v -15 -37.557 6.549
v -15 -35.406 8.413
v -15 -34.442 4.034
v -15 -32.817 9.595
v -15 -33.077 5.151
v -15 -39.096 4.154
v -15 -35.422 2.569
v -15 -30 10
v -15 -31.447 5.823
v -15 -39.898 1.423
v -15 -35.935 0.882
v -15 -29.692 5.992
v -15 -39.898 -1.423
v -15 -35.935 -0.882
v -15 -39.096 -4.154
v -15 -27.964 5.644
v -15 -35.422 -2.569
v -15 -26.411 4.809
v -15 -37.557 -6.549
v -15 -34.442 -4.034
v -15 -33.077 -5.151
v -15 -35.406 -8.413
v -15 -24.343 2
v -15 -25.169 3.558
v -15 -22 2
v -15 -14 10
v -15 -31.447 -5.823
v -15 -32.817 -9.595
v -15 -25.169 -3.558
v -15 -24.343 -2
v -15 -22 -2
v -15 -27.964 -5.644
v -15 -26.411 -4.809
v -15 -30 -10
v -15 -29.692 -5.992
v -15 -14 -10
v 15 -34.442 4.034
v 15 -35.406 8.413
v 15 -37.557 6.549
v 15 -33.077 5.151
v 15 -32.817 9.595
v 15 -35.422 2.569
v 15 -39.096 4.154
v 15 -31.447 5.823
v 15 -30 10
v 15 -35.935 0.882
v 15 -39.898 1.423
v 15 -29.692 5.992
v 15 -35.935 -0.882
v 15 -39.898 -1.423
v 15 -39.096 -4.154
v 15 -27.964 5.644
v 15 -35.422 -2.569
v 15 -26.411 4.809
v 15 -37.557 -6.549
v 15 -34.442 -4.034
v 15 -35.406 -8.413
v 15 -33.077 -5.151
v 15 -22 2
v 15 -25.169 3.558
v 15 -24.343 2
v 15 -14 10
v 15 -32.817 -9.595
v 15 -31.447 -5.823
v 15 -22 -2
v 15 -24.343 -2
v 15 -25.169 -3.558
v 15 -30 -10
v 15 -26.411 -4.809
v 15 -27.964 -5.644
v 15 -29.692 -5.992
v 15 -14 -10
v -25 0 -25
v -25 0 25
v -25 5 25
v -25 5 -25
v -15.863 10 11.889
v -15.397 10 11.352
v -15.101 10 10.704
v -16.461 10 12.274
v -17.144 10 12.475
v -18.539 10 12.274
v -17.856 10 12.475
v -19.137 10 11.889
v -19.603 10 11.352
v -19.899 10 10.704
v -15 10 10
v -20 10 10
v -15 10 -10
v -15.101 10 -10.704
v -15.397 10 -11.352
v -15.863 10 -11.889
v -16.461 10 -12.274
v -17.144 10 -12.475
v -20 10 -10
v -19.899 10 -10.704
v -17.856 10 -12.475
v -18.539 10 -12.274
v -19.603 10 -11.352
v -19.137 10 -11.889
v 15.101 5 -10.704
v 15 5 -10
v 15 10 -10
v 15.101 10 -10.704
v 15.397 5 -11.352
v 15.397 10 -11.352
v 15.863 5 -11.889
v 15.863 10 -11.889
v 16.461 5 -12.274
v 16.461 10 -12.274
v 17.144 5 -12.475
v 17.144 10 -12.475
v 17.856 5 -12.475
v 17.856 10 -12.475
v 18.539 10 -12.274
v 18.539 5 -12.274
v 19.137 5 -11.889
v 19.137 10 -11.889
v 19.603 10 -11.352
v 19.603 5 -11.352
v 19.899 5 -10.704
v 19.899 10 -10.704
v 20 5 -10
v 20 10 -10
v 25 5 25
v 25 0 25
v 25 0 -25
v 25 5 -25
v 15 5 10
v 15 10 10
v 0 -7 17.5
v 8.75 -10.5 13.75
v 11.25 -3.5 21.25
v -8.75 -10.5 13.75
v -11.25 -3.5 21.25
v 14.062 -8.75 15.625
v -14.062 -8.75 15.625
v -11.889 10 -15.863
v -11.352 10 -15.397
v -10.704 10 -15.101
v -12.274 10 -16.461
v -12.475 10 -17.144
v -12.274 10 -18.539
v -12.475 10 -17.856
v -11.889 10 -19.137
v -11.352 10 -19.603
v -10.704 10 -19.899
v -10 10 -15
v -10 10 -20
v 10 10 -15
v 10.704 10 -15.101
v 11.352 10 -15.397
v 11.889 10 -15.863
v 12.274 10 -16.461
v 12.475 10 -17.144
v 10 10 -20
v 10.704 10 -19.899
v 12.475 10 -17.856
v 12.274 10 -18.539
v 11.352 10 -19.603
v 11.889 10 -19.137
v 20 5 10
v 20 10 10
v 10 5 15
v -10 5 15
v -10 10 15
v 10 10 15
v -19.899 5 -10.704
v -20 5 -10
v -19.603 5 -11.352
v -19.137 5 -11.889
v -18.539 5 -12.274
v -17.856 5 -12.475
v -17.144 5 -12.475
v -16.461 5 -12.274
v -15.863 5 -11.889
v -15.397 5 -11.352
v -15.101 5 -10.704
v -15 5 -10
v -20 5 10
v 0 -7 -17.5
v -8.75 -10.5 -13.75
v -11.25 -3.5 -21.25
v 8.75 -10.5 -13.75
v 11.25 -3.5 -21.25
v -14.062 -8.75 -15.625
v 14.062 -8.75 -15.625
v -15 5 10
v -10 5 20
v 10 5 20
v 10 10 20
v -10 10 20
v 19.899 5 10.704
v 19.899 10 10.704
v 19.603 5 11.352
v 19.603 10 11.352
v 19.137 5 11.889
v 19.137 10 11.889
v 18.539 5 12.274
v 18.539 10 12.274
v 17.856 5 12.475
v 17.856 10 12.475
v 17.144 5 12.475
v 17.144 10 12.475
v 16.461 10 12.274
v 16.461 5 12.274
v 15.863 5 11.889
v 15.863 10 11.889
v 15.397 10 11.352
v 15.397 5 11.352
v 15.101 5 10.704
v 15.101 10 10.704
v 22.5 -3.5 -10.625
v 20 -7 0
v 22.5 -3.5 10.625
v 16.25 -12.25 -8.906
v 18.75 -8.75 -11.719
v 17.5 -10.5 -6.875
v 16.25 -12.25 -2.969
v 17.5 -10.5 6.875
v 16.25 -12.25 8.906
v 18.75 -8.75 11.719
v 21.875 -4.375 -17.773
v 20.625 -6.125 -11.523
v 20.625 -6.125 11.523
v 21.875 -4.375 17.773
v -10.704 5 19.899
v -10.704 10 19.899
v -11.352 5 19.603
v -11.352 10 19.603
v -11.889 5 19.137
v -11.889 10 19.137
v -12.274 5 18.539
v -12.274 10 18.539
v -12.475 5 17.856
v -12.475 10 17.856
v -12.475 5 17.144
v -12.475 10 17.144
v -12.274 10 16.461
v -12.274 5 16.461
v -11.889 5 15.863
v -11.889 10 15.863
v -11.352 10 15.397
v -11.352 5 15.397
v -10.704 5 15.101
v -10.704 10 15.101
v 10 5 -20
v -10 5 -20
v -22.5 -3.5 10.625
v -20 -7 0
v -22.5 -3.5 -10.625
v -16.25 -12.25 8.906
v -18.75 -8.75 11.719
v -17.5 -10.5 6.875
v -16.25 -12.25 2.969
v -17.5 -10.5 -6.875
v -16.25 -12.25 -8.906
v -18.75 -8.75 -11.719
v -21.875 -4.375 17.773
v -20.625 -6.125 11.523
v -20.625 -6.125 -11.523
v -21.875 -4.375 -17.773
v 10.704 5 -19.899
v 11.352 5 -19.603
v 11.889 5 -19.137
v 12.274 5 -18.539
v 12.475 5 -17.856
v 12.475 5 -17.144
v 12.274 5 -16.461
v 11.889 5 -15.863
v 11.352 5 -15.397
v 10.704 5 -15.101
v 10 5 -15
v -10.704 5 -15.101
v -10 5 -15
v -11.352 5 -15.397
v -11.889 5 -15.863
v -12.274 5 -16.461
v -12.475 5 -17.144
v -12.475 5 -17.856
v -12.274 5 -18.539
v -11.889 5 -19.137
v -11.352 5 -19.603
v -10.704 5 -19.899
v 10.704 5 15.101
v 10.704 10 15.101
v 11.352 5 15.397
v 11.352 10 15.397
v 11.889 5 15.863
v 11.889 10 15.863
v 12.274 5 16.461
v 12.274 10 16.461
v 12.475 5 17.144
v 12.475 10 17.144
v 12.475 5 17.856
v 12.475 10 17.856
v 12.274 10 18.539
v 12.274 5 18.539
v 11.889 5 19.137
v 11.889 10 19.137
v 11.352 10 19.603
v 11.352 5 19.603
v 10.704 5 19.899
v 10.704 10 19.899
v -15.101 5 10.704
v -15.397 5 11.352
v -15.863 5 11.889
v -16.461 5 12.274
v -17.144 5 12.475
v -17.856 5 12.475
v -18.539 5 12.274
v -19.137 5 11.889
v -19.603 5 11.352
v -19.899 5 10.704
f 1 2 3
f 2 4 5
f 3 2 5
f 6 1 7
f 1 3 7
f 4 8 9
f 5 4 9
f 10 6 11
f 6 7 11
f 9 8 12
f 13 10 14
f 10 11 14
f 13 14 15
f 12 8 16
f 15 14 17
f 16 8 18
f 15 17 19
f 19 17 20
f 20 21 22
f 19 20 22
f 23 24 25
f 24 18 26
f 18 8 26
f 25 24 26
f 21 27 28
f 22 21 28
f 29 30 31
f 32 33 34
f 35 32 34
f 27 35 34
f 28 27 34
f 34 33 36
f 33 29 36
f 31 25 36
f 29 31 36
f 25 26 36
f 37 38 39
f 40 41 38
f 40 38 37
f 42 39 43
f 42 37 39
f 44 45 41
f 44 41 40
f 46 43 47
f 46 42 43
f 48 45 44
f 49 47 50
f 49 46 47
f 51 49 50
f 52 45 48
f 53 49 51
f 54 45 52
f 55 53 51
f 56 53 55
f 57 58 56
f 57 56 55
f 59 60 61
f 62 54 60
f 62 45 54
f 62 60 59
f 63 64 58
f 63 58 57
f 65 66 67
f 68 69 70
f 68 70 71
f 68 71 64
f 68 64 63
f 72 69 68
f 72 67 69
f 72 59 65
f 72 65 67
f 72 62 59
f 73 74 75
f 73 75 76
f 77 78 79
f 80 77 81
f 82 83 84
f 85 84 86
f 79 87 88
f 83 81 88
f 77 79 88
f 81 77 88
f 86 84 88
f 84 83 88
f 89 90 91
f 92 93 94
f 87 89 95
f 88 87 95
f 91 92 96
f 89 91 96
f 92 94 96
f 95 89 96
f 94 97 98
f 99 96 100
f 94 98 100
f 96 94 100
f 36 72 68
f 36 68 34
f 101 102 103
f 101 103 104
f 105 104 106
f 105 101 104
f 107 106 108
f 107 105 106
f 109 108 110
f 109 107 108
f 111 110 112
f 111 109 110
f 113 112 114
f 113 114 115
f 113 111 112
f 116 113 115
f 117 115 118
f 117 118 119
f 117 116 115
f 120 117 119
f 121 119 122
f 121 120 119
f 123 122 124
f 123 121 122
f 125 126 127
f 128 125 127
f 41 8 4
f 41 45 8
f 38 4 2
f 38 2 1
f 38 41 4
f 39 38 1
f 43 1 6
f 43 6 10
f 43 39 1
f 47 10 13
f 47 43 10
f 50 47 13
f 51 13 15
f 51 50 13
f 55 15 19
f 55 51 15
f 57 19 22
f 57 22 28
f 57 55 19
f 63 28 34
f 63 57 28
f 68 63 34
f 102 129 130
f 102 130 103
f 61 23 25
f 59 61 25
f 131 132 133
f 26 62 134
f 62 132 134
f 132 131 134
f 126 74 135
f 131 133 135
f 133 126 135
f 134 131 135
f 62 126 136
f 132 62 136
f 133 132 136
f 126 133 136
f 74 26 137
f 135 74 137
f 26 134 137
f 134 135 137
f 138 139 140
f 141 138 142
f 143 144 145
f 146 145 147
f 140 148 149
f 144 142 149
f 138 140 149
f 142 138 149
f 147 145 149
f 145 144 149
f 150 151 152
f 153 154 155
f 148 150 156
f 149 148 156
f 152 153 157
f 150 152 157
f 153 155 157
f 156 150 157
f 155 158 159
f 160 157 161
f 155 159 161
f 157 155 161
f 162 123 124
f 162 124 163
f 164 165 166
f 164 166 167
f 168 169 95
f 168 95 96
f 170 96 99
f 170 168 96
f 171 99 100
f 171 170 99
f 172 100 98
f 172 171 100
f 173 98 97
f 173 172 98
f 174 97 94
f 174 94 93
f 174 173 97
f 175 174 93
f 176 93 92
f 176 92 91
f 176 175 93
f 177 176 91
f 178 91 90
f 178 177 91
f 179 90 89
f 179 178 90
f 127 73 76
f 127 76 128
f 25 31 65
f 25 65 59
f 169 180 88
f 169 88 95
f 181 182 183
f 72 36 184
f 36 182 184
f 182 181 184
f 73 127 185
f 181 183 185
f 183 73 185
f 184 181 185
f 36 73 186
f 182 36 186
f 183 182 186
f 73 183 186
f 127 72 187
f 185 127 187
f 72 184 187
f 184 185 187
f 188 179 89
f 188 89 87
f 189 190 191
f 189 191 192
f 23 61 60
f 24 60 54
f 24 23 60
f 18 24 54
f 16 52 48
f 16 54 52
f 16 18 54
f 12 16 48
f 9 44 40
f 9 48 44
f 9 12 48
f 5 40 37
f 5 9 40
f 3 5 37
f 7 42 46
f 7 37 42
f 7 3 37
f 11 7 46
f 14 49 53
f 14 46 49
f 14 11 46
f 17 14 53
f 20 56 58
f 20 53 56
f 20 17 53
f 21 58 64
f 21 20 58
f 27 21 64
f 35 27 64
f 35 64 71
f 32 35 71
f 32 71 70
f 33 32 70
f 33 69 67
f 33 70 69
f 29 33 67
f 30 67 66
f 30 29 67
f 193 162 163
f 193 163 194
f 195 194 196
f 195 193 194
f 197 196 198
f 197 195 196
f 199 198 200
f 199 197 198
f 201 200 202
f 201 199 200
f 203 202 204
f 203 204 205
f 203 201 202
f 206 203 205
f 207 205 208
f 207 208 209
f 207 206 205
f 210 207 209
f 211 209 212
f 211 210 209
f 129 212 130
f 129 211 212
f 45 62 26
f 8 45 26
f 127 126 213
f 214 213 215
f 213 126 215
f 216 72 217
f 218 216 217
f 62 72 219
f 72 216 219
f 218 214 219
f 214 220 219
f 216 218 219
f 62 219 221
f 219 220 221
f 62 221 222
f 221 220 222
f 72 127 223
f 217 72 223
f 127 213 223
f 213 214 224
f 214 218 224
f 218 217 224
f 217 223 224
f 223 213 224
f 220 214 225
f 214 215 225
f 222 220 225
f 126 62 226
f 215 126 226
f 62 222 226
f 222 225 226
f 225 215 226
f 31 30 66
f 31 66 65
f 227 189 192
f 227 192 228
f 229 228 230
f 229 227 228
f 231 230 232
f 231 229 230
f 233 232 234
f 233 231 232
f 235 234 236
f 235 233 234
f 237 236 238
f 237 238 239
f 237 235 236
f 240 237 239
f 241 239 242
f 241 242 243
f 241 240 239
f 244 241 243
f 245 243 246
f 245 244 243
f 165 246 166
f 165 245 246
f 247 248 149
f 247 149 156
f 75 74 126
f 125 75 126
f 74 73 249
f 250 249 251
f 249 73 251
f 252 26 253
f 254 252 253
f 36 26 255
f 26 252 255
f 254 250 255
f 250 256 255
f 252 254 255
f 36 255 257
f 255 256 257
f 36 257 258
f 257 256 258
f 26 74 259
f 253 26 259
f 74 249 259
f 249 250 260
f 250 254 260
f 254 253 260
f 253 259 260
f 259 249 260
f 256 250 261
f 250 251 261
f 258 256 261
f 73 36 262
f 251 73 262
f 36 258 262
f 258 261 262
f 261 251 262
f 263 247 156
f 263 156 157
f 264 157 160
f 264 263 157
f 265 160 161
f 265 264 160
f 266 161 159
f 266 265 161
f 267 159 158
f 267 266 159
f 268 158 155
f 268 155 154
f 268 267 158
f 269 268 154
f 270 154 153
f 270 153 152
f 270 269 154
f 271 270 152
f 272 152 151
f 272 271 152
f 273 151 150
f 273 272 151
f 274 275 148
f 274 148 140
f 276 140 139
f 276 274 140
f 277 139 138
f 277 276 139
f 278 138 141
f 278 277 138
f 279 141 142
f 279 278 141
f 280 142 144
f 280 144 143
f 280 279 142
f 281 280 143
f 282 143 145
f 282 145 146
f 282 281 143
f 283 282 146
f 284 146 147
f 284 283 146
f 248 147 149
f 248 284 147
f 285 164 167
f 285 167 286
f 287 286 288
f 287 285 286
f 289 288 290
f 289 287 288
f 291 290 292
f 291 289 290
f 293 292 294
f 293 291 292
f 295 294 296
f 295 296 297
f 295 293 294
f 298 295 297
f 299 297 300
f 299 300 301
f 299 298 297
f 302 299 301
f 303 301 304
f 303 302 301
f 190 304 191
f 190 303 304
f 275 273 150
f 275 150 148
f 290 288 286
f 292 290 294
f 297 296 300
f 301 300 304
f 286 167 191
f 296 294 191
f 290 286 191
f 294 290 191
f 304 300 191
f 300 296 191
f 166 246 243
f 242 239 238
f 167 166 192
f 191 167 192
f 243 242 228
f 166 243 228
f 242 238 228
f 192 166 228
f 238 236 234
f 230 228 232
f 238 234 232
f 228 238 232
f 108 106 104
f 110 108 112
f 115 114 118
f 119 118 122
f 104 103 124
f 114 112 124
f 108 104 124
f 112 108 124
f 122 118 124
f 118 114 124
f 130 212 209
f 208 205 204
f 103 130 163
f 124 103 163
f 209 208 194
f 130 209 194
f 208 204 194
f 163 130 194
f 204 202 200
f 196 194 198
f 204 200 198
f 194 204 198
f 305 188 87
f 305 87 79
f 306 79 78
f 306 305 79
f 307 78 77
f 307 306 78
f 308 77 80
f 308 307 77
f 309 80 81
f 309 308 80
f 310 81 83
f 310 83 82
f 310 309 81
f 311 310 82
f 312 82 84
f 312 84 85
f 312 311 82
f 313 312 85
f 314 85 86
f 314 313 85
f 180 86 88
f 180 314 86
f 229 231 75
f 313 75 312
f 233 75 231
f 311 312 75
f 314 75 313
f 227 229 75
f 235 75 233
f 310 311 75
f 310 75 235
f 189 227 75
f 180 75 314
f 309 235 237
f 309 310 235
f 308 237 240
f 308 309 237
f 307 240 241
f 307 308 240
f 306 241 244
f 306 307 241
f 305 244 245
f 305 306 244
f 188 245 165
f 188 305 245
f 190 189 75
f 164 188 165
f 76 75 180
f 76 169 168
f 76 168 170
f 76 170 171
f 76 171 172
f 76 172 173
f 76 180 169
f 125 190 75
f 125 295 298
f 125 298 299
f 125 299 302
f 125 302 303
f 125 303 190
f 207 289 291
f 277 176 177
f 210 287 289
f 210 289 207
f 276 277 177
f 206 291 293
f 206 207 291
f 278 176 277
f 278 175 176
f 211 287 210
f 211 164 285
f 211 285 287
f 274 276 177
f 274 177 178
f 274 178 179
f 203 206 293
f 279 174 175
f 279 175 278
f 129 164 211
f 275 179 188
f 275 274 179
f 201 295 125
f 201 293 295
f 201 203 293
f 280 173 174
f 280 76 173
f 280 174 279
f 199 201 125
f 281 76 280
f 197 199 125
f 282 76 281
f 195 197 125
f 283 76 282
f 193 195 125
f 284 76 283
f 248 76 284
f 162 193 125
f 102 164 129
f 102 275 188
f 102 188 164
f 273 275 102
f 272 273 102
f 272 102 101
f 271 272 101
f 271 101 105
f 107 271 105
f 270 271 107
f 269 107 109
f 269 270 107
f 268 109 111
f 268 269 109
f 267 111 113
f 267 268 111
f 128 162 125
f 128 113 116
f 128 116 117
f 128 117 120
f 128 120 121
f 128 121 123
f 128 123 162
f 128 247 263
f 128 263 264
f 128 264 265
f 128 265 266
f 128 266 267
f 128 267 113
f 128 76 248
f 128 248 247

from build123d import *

# Parameters (mm, degrees)
SKETCH1_W                = 50
SKETCH1_H                = 50
BOSS_EXTRUDE1_DEPTH      = 5
BOSS_EXTRUDE2_DEPTH      = 5
CIRPATTERN1_COUNT        = 4
SKETCH3_R                = 10
SKETCH3_R_2              = 6
BOSS_EXTRUDE3_DEPTH      = 15
BOSS_EXTRUDE4_REACH      = 45.886
BOSS_EXTRUDE4_END_RADIUS = 10
SKETCH4_W                = 30
SKETCH4_H                = 20
SKETCH5_W                = 4
SKETCH5_H                = 4
CUT_EXTRUDE2_DEPTH       = 30


with BuildPart() as part:
    # Sketch1 → Boss-Extrude1 (new body)
    with BuildSketch(Plane(origin=(0, 0, 0), x_dir=(1, 0, 0), z_dir=(0, 1, 0))):
        Rectangle(SKETCH1_W, SKETCH1_H)
    extrude(amount=BOSS_EXTRUDE1_DEPTH)

    # Sketch2 → Boss-Extrude2 (add)
    with BuildSketch(Plane(origin=(0, 5, 0), x_dir=(1, 0, 0), z_dir=(0, 1, 0))):
        with BuildLine():
            Line((-15, 10), (-15, -10))
            ThreePointArc((-15, -10), (-17.5, -12.5), (-20, -10))
            Line((-20, -10), (-20, 10))
            ThreePointArc((-20, 10), (-17.5, 12.5), (-15, 10))
        make_face()
    boss_extrude2 = extrude(amount=BOSS_EXTRUDE2_DEPTH)

    # CirPattern1: Boss-Extrude2 ×4 about axis
    cirpattern1_axis = Axis((0, 0, 0), (0, 1, 0))
    for i in range(1, CIRPATTERN1_COUNT):
        add(boss_extrude2.rotate(cirpattern1_axis, i * 360 / CIRPATTERN1_COUNT))


with BuildPart() as body_2:
    # Sketch3 → Boss-Extrude3 (new, symmetric)
    with BuildSketch(Plane(origin=(0, 0, 0), x_dir=(0, 0, -1), z_dir=(1, 0, 0))):
        with Locations((0, -30)):
            Circle(SKETCH3_R)
        with Locations((0, -30)):
            Circle(SKETCH3_R_2, mode=Mode.SUBTRACT)
    extrude(amount=BOSS_EXTRUDE3_DEPTH, both=True)

    # Boss-Extrude4: up to this cylinder (the profile starts outside it)
    boss_extrude4_end = Plane(origin=(0, -30, 0), z_dir=(-1, 0, 0)) * Cylinder(BOSS_EXTRUDE4_END_RADIUS, 112.772, mode=Mode.PRIVATE)
    # Sketch4 → Boss-Extrude4 (add, up to the surface)
    with BuildSketch(Plane(origin=(0, -14, 0), x_dir=(-1, 0, 0), z_dir=(0, -1, 0)), mode=Mode.PRIVATE) as boss_extrude4_sk1:
        Rectangle(SKETCH4_W, SKETCH4_H)
    boss_extrude4_tool1 = extrude(boss_extrude4_sk1.sketch, amount=BOSS_EXTRUDE4_REACH, mode=Mode.PRIVATE) - boss_extrude4_end
    add(boss_extrude4_tool1.solids().sort_by_distance((0, -14, 0))[0])


    add(part.part)  # loft1 joins it to this body
    # loft from a face of the part (loft1)
    loft([body_2.faces().sort_by_distance((0, -14, 0))[0], body_2.faces().sort_by_distance((0, 0, 0))[0]])

    # Sketch5 → Cut-Extrude2 (cut)
    with BuildSketch(Plane.ZY.offset(15)):
        with Locations((0, -24)):
            Rectangle(SKETCH5_W, SKETCH5_H)
    extrude(amount=-CUT_EXTRUDE2_DEPTH, mode=Mode.SUBTRACT)


solid = body_2.part
